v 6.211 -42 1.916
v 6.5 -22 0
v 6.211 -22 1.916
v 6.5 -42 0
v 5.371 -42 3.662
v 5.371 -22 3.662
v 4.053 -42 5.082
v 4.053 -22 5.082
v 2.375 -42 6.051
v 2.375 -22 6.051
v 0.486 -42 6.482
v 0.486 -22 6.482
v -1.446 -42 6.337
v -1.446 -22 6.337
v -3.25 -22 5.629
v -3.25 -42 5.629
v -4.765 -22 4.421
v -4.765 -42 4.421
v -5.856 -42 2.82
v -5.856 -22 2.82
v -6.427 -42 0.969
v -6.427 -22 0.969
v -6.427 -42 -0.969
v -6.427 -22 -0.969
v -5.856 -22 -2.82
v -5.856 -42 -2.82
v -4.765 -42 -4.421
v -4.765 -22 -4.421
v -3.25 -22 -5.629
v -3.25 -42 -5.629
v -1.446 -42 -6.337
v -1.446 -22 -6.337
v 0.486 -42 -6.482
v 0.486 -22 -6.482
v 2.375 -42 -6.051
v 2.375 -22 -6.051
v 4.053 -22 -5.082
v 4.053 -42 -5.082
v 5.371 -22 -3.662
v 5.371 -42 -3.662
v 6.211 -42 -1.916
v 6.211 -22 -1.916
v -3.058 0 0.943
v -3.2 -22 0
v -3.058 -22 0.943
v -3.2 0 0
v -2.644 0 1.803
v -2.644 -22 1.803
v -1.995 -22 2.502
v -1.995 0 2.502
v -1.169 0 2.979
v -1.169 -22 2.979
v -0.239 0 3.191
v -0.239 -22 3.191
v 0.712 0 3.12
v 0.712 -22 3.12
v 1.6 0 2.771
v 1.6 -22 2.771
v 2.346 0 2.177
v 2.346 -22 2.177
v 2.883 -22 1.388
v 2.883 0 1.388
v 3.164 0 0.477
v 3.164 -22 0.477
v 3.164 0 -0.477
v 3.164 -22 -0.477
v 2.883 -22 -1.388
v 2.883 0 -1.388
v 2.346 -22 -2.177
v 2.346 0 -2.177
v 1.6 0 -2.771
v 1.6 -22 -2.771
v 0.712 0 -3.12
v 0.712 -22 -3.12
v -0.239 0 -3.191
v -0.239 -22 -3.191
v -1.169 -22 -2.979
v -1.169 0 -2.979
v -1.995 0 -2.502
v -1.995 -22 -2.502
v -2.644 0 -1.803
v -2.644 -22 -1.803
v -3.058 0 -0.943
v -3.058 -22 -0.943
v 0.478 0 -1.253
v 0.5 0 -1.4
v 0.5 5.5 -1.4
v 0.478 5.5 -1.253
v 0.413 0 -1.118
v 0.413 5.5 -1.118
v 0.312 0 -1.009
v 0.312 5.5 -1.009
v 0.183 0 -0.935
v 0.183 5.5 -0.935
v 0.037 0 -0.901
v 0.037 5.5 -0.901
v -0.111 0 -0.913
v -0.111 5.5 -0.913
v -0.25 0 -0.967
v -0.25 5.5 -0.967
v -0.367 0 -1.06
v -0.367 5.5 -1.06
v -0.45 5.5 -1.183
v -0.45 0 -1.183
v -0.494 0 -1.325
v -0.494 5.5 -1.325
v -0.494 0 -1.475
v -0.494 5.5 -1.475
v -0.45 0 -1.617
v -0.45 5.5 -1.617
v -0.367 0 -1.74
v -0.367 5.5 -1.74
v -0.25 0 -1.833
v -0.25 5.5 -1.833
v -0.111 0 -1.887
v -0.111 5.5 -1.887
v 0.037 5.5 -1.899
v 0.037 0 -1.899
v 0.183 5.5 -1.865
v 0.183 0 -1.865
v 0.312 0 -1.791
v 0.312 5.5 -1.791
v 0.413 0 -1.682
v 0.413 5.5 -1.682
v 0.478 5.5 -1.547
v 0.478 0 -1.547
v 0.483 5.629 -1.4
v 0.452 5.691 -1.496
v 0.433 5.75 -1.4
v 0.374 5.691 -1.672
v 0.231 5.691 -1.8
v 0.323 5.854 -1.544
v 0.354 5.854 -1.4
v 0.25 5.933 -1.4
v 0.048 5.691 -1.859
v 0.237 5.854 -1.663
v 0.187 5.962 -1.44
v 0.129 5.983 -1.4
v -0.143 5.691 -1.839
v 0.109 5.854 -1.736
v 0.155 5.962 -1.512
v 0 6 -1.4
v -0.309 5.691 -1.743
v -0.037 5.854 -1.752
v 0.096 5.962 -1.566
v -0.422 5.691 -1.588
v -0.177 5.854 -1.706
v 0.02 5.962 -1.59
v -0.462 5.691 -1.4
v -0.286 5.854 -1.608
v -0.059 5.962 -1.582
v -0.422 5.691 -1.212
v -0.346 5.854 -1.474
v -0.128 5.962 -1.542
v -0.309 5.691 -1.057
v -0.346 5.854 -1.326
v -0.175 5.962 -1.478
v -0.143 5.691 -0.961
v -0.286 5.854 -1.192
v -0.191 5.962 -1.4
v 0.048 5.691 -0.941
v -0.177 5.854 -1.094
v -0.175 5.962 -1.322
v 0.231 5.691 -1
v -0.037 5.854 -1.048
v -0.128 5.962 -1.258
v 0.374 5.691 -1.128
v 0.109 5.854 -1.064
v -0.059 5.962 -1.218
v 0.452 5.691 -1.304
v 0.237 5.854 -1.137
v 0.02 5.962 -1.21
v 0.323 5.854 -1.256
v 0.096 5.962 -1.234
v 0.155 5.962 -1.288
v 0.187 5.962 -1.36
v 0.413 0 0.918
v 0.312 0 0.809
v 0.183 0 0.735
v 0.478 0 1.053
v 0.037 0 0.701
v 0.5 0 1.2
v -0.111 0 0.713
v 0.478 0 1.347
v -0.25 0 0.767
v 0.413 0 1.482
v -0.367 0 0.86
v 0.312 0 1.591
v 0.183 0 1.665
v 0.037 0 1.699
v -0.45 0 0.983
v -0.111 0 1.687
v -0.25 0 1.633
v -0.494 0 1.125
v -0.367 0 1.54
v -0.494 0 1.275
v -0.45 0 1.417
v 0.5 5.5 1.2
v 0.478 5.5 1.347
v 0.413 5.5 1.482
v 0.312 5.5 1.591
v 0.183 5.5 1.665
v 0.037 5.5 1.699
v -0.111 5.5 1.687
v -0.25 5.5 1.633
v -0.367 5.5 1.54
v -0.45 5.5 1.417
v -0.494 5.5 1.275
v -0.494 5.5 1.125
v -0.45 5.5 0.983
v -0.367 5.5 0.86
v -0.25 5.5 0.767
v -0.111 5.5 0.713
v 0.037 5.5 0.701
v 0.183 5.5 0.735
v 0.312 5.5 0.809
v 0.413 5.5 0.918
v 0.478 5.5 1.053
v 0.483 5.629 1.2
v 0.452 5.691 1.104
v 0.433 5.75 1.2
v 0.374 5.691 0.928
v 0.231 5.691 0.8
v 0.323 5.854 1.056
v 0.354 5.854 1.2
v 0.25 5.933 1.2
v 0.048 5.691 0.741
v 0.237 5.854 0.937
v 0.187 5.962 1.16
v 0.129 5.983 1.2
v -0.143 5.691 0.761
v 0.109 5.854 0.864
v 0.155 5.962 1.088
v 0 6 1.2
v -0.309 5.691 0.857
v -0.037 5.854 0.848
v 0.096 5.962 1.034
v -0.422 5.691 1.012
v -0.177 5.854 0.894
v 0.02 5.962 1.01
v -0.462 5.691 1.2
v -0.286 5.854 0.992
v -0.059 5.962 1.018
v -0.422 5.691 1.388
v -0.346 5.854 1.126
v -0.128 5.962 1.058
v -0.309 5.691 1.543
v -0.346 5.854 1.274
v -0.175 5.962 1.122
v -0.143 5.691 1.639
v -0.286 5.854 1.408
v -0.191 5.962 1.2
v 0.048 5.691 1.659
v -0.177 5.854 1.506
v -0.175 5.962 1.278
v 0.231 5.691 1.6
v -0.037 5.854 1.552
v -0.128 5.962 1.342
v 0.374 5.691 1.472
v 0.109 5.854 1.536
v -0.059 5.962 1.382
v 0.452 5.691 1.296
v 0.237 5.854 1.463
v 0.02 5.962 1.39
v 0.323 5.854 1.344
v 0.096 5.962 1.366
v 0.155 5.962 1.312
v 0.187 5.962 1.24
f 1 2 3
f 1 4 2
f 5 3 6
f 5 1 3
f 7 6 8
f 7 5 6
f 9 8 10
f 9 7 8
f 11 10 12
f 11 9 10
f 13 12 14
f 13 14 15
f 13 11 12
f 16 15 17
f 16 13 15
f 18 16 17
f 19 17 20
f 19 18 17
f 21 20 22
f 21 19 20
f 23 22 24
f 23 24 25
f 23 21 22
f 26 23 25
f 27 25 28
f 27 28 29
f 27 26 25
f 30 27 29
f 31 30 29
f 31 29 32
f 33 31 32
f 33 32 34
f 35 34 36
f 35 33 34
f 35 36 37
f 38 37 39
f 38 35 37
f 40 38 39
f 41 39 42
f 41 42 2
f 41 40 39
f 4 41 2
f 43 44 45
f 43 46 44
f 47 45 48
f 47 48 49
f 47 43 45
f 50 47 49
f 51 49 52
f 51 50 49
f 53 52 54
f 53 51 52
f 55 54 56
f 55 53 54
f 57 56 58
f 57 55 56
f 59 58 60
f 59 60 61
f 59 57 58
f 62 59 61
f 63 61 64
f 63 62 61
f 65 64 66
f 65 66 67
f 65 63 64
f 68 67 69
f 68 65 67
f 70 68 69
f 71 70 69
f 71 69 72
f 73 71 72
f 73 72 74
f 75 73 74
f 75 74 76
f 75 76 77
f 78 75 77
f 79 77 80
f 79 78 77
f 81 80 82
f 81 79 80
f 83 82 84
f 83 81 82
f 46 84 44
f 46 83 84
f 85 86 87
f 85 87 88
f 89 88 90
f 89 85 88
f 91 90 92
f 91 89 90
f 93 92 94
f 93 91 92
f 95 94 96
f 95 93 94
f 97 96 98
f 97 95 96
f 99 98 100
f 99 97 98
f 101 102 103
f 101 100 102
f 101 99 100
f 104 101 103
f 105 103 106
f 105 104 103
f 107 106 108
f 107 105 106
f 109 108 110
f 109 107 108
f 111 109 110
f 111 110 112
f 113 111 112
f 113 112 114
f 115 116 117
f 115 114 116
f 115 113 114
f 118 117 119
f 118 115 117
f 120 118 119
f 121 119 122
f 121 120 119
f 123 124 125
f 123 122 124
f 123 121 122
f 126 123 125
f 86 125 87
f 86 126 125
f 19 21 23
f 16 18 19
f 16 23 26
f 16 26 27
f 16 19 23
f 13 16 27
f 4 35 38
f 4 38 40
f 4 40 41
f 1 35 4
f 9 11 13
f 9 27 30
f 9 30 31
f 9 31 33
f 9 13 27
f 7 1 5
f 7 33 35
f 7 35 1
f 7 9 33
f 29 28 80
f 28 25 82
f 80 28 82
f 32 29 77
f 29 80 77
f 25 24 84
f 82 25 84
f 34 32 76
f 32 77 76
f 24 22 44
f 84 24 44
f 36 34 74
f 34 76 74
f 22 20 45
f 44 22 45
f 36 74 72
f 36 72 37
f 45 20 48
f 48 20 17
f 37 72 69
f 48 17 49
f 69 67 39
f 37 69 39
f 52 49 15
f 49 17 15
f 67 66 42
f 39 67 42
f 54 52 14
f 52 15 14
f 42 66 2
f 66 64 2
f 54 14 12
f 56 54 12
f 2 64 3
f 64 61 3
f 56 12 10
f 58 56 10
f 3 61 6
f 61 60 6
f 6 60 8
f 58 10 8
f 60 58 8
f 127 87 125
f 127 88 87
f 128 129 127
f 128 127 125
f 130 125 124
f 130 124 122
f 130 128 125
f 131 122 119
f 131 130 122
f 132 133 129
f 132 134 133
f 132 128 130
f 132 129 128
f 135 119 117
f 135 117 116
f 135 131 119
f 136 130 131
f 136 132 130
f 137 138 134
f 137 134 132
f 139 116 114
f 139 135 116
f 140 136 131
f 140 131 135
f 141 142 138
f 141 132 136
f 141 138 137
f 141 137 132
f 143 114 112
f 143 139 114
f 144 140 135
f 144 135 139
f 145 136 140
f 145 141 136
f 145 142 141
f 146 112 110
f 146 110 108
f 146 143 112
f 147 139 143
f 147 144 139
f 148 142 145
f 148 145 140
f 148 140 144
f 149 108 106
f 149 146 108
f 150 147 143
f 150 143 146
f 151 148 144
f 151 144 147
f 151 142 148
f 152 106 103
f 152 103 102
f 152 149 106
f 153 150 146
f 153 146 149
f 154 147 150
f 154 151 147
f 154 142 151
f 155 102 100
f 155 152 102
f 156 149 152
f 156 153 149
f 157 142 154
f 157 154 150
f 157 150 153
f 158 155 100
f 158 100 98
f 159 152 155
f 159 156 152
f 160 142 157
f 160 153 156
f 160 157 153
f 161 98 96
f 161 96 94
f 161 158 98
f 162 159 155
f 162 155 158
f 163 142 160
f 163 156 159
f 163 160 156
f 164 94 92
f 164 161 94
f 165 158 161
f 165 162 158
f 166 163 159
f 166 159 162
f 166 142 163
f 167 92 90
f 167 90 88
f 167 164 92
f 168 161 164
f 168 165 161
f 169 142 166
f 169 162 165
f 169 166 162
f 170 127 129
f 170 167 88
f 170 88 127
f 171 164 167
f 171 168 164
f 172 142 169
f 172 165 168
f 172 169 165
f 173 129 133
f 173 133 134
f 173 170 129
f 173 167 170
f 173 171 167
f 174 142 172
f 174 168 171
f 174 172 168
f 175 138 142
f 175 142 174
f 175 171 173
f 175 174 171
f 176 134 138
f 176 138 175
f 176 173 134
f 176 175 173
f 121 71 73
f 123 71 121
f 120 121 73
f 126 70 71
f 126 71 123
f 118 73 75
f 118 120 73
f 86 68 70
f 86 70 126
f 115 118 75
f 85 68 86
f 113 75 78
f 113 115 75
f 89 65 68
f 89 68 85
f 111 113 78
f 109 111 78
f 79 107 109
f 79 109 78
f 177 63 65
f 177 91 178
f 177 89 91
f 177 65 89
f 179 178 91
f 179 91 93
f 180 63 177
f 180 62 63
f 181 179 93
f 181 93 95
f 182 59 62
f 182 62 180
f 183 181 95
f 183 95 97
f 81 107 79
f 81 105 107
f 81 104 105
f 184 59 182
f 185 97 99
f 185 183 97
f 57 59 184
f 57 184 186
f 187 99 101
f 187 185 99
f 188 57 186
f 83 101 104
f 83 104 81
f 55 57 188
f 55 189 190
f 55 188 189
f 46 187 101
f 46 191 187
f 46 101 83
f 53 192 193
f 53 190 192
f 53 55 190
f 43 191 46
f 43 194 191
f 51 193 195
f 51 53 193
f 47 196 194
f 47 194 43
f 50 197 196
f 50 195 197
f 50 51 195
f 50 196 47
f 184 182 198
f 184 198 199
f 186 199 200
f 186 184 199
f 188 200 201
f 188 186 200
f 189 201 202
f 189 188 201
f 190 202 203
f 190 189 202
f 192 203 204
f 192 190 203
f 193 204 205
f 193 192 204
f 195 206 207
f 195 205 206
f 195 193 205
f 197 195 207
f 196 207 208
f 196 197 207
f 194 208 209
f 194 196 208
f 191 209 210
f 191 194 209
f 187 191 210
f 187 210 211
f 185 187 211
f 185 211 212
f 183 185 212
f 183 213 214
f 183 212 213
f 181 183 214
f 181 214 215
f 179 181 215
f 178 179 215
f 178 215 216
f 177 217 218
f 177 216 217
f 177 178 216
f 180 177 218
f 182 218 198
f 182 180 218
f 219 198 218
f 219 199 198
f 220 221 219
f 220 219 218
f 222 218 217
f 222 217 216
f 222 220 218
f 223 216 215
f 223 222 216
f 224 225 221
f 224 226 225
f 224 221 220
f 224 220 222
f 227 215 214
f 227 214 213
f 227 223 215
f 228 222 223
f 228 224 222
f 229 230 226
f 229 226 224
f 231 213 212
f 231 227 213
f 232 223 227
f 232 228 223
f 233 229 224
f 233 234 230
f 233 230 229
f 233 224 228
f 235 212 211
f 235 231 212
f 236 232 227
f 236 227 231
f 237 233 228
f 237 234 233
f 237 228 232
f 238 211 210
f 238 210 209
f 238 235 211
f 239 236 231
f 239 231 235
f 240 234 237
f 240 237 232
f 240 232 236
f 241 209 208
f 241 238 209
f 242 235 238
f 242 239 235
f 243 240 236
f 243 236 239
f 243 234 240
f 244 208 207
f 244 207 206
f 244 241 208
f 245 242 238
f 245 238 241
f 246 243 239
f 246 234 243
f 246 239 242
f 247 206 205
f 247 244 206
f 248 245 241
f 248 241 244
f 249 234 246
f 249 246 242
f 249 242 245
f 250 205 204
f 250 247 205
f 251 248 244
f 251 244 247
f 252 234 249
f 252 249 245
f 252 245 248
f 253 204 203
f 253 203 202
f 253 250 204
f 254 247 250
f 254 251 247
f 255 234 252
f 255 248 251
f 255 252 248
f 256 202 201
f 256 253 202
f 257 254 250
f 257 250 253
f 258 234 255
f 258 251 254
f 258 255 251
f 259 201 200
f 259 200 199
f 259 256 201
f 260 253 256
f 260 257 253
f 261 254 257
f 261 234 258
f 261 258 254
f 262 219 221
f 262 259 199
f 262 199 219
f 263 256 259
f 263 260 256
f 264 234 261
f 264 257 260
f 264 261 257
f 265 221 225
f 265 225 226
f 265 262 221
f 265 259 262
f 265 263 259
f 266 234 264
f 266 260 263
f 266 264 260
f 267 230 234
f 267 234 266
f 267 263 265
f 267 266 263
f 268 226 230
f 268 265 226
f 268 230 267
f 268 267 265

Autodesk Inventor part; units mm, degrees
ref_plane "YZ Plane" through (0, 0, 0) normal (1, 0, 0) x (0, 1, 0)
ref_plane "XZ Plane" through (0, 0, 0) normal (0, 1, 0) x (-1, 0, 0)
ref_plane "XY Plane" through (0, 0, 0) normal (0, 0, 1) x (1, 0, 0)
sketch "Sketch1" plane through (0, 0, 0) normal (0, 1, 0) x (-1, 0, 0)
  circle A0 centre (0, 0) radius 3.2
  dimension "d0" = 6.4
extrude "Extrusion1" add sketch "Sketch1" against normal blind 42
sketch "Sketch2" plane through (0, -42, 0) normal (0, -1, 0) x (1, 0, 0)
  circle A0 centre (0, 0) radius 6.5
  dimension "d3" = 13
extrude "Extrusion2" add sketch "Sketch2" against normal blind 20
sketch "Sketch3" plane through (0, 0, 0) normal (0, 1, 0) x (1, 0, 0)
  circle A0 centre (0, 0) radius 3.2 projected
  line L0 (0, -3.2) -> (0, 3.2) construction
  circle A1 centre (0, -1.2) radius 0.5
  circle A2 centre (0, 1.4) radius 0.5
  dimension "d6" = 0
  dimension "d7" = 1
  dimension "d8" = 1
  dimension "d9" = 1.8
  dimension "d10" = 2.6
extrude "Extrusion3" add sketch "Sketch3" along normal blind 6 contours A1 | A2
fillet "Fillet1" radius 0.5 2 edges at (-0.5, 6, -1.4) (-0.5, 6, 1.2)
properties part number "Arc Water Sensor"
